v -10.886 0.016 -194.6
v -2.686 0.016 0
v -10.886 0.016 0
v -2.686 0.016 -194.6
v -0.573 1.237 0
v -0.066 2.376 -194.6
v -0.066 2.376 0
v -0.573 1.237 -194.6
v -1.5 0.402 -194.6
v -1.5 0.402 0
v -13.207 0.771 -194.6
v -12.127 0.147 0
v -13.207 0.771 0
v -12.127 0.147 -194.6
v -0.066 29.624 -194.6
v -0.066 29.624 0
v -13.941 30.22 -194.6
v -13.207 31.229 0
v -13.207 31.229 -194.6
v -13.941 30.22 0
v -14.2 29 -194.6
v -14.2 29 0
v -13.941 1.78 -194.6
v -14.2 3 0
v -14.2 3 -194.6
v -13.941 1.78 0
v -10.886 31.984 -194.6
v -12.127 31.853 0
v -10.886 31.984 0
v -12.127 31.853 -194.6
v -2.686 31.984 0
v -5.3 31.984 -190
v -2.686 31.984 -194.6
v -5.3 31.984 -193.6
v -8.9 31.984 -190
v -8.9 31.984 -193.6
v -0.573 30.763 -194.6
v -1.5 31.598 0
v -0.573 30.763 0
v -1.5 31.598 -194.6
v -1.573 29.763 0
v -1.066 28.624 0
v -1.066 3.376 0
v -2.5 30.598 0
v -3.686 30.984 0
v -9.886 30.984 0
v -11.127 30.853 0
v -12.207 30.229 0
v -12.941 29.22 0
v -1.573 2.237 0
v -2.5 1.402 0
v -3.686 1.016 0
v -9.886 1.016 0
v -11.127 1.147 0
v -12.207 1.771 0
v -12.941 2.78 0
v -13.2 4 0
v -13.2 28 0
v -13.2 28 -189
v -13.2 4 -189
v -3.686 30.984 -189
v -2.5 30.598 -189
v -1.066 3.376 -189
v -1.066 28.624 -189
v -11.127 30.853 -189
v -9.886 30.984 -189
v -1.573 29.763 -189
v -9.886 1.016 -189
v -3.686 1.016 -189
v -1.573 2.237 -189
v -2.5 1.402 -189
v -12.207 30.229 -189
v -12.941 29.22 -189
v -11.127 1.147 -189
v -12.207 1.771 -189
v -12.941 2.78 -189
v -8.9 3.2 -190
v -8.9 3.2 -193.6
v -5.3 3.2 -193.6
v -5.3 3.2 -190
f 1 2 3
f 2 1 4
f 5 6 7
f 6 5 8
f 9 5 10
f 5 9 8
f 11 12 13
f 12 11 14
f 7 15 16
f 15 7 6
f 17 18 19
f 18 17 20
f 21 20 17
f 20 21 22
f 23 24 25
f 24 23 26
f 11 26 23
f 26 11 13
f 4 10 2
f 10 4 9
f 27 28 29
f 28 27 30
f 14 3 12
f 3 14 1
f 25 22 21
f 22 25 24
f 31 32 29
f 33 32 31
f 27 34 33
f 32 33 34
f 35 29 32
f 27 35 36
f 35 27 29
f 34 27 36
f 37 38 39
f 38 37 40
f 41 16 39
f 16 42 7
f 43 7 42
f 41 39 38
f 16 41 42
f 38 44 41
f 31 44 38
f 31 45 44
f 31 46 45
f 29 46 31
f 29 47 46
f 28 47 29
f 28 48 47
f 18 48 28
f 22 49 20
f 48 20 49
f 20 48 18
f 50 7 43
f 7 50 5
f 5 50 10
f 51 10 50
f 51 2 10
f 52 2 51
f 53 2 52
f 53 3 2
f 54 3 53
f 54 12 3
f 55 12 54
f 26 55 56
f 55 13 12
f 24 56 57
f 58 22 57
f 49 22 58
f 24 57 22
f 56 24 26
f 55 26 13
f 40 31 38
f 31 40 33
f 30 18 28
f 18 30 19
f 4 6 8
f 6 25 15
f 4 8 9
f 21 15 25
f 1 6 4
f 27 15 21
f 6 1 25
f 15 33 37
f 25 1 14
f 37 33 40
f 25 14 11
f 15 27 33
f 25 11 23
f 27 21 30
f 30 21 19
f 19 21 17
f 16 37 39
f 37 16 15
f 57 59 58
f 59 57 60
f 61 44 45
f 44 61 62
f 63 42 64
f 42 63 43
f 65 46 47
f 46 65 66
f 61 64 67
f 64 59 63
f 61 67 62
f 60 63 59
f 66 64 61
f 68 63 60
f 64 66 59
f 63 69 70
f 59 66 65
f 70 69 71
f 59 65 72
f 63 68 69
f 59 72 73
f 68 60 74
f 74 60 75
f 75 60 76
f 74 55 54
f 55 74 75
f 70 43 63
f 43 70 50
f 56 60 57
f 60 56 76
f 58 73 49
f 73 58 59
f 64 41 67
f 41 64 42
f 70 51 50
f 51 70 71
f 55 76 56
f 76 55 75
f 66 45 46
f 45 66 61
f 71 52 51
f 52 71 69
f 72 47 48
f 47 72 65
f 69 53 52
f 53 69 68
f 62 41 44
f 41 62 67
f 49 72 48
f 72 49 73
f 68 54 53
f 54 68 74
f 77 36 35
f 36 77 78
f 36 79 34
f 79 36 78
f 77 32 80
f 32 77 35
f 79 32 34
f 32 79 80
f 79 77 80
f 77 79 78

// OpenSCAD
// Max Pill Diameter
PR = 8; // [1:15]
 
// Max Pill Length
PF = 8; // [1:15]

// What to print
Thing="cover"; // [cover, inside, insidewithletters, both]

// Circle Fidelity
FN =15; // [15:360]

module dont_customize(){}


WL = 1; // wall thickness
GAP = 2.2;
SW = 2; // sidewall
BW = GAP; // bottom wall

MH = 26;
MXY = 3.6;

AIR = 1;
RND = 3; // rounding for outer container

MW = 1; // magnet wall

CELL = GAP+PR+PF+PR;
INNERY = 2 * (AIR+GAP+PR)+PF;
OUTERY = INNERY + 2 * WL;
INNERX = 2 * (PR+SW)+PF;
INNERZ = GAP+PR;
OUTERZ = INNERZ+2*AIR+2*WL;

$fn = FN;
//thing("both");
//thing("insidewithletters");
//thing("cover");
thing(Thing);

module thing(typ)
{
    if (typ == "inside")
    {

        difference()
        {
             translate([0,-INNERX/2,0]) 
                union()
                {
                        cubeS([MW+MXY+MW+AIR+7*CELL,SW+PR+PF+PR+SW,BW+PR],RND);                    
                        hull()
                    {
                        translate([MW+MXY+MW+AIR+7*CELL,0,0]) cubeS([1,SW+PR+PF+PR+SW,BW+PR],RND);   
                        translate([PR+PF/2+MW+MXY+MW+7*CELL,SW+PR+PF/2,0]) cylinder(d=SW+PR+PF+PR+SW,h=BW+PR);
                    }
                }
                for (i = [0:7])
                {
                    translate([PR+PF/2+MW+MXY+MW+i*CELL,0,PR+BW])minkowski()
                    {
                        cylinder(d=PF,h=PR);
                        sphere(r=PR);
                    }
                }

                translate([PR+PF/2+MW+MXY+MW+7*CELL,0,PR+BW-50])cylinder(d=PF,h=100); // hole through day 8

                translate([MW,-MH/2,(GAP+PR)/2-MXY/2]) cube([MXY,MH+100,MXY]); // magnet
        }
    }

    if (typ == "cover")
    {
        rotate([180,0,180])
        {

            difference()
            {
                cubeR([WL+AIR+BW+PR+AIR+WL,WL+AIR+SW+PR+PF+PR+SW+AIR+WL,2*(MW+MXY+MW)+7*CELL],RND);
                translate([WL,WL,0]) cubeR([AIR+BW+PR+AIR,AIR+SW+PR+PF+PR+SW+AIR,MW+MXY+MW+7*CELL],RND);
                translate([OUTERZ/2-MXY/2,-MH/2+OUTERY/2,MW+MXY+MW+MW+7*CELL]) cube([MXY,MH+100,MXY]);
            }
        }  
    }

    if (typ == "insidewithletters")
    {
        difference()
        {
            thing("inside");
            //thing("cover");
            days = ["M", "T", "W", "T", "F", "S", "S" ];
            for (i=[0:6])
            {
                translate([PR+PF/2+MW+MXY+MW+i*CELL,0,1]) linear_extrude(height = 10)
                {
                    text(font="Arial:style=bold", size = 12, text=days[i],halign="center",valign="center");
                }
            }
        }
    }

    if (typ == "both")
    {
        rotate([0,90,0]) translate([0,0,7*CELL+AIR+MW+MXY+MW]) thing("cover");
        translate([0,WL+AIR+SW+PR+PF/2,WL+AIR]) thing("insidewithletters");
    }
    
}

module cubeR(v,vr)
{
    translate([vr,vr,0]) minkowski()
    {
       cube([v[0]-vr-vr,v[1]-vr-vr,v[2]-1]);
       cylinder(h=1,r=vr); 
    }
    
}

module cubeS(v,vr)
{
        
    translate([0,vr-0.5,vr]) minkowski()
     {
       cube([v[0],v[1]-vr-vr+1,v[2]-vr-vr]);
       rotate([0,90,0])cylinder(h=1,r=vr); 
    }
 }
